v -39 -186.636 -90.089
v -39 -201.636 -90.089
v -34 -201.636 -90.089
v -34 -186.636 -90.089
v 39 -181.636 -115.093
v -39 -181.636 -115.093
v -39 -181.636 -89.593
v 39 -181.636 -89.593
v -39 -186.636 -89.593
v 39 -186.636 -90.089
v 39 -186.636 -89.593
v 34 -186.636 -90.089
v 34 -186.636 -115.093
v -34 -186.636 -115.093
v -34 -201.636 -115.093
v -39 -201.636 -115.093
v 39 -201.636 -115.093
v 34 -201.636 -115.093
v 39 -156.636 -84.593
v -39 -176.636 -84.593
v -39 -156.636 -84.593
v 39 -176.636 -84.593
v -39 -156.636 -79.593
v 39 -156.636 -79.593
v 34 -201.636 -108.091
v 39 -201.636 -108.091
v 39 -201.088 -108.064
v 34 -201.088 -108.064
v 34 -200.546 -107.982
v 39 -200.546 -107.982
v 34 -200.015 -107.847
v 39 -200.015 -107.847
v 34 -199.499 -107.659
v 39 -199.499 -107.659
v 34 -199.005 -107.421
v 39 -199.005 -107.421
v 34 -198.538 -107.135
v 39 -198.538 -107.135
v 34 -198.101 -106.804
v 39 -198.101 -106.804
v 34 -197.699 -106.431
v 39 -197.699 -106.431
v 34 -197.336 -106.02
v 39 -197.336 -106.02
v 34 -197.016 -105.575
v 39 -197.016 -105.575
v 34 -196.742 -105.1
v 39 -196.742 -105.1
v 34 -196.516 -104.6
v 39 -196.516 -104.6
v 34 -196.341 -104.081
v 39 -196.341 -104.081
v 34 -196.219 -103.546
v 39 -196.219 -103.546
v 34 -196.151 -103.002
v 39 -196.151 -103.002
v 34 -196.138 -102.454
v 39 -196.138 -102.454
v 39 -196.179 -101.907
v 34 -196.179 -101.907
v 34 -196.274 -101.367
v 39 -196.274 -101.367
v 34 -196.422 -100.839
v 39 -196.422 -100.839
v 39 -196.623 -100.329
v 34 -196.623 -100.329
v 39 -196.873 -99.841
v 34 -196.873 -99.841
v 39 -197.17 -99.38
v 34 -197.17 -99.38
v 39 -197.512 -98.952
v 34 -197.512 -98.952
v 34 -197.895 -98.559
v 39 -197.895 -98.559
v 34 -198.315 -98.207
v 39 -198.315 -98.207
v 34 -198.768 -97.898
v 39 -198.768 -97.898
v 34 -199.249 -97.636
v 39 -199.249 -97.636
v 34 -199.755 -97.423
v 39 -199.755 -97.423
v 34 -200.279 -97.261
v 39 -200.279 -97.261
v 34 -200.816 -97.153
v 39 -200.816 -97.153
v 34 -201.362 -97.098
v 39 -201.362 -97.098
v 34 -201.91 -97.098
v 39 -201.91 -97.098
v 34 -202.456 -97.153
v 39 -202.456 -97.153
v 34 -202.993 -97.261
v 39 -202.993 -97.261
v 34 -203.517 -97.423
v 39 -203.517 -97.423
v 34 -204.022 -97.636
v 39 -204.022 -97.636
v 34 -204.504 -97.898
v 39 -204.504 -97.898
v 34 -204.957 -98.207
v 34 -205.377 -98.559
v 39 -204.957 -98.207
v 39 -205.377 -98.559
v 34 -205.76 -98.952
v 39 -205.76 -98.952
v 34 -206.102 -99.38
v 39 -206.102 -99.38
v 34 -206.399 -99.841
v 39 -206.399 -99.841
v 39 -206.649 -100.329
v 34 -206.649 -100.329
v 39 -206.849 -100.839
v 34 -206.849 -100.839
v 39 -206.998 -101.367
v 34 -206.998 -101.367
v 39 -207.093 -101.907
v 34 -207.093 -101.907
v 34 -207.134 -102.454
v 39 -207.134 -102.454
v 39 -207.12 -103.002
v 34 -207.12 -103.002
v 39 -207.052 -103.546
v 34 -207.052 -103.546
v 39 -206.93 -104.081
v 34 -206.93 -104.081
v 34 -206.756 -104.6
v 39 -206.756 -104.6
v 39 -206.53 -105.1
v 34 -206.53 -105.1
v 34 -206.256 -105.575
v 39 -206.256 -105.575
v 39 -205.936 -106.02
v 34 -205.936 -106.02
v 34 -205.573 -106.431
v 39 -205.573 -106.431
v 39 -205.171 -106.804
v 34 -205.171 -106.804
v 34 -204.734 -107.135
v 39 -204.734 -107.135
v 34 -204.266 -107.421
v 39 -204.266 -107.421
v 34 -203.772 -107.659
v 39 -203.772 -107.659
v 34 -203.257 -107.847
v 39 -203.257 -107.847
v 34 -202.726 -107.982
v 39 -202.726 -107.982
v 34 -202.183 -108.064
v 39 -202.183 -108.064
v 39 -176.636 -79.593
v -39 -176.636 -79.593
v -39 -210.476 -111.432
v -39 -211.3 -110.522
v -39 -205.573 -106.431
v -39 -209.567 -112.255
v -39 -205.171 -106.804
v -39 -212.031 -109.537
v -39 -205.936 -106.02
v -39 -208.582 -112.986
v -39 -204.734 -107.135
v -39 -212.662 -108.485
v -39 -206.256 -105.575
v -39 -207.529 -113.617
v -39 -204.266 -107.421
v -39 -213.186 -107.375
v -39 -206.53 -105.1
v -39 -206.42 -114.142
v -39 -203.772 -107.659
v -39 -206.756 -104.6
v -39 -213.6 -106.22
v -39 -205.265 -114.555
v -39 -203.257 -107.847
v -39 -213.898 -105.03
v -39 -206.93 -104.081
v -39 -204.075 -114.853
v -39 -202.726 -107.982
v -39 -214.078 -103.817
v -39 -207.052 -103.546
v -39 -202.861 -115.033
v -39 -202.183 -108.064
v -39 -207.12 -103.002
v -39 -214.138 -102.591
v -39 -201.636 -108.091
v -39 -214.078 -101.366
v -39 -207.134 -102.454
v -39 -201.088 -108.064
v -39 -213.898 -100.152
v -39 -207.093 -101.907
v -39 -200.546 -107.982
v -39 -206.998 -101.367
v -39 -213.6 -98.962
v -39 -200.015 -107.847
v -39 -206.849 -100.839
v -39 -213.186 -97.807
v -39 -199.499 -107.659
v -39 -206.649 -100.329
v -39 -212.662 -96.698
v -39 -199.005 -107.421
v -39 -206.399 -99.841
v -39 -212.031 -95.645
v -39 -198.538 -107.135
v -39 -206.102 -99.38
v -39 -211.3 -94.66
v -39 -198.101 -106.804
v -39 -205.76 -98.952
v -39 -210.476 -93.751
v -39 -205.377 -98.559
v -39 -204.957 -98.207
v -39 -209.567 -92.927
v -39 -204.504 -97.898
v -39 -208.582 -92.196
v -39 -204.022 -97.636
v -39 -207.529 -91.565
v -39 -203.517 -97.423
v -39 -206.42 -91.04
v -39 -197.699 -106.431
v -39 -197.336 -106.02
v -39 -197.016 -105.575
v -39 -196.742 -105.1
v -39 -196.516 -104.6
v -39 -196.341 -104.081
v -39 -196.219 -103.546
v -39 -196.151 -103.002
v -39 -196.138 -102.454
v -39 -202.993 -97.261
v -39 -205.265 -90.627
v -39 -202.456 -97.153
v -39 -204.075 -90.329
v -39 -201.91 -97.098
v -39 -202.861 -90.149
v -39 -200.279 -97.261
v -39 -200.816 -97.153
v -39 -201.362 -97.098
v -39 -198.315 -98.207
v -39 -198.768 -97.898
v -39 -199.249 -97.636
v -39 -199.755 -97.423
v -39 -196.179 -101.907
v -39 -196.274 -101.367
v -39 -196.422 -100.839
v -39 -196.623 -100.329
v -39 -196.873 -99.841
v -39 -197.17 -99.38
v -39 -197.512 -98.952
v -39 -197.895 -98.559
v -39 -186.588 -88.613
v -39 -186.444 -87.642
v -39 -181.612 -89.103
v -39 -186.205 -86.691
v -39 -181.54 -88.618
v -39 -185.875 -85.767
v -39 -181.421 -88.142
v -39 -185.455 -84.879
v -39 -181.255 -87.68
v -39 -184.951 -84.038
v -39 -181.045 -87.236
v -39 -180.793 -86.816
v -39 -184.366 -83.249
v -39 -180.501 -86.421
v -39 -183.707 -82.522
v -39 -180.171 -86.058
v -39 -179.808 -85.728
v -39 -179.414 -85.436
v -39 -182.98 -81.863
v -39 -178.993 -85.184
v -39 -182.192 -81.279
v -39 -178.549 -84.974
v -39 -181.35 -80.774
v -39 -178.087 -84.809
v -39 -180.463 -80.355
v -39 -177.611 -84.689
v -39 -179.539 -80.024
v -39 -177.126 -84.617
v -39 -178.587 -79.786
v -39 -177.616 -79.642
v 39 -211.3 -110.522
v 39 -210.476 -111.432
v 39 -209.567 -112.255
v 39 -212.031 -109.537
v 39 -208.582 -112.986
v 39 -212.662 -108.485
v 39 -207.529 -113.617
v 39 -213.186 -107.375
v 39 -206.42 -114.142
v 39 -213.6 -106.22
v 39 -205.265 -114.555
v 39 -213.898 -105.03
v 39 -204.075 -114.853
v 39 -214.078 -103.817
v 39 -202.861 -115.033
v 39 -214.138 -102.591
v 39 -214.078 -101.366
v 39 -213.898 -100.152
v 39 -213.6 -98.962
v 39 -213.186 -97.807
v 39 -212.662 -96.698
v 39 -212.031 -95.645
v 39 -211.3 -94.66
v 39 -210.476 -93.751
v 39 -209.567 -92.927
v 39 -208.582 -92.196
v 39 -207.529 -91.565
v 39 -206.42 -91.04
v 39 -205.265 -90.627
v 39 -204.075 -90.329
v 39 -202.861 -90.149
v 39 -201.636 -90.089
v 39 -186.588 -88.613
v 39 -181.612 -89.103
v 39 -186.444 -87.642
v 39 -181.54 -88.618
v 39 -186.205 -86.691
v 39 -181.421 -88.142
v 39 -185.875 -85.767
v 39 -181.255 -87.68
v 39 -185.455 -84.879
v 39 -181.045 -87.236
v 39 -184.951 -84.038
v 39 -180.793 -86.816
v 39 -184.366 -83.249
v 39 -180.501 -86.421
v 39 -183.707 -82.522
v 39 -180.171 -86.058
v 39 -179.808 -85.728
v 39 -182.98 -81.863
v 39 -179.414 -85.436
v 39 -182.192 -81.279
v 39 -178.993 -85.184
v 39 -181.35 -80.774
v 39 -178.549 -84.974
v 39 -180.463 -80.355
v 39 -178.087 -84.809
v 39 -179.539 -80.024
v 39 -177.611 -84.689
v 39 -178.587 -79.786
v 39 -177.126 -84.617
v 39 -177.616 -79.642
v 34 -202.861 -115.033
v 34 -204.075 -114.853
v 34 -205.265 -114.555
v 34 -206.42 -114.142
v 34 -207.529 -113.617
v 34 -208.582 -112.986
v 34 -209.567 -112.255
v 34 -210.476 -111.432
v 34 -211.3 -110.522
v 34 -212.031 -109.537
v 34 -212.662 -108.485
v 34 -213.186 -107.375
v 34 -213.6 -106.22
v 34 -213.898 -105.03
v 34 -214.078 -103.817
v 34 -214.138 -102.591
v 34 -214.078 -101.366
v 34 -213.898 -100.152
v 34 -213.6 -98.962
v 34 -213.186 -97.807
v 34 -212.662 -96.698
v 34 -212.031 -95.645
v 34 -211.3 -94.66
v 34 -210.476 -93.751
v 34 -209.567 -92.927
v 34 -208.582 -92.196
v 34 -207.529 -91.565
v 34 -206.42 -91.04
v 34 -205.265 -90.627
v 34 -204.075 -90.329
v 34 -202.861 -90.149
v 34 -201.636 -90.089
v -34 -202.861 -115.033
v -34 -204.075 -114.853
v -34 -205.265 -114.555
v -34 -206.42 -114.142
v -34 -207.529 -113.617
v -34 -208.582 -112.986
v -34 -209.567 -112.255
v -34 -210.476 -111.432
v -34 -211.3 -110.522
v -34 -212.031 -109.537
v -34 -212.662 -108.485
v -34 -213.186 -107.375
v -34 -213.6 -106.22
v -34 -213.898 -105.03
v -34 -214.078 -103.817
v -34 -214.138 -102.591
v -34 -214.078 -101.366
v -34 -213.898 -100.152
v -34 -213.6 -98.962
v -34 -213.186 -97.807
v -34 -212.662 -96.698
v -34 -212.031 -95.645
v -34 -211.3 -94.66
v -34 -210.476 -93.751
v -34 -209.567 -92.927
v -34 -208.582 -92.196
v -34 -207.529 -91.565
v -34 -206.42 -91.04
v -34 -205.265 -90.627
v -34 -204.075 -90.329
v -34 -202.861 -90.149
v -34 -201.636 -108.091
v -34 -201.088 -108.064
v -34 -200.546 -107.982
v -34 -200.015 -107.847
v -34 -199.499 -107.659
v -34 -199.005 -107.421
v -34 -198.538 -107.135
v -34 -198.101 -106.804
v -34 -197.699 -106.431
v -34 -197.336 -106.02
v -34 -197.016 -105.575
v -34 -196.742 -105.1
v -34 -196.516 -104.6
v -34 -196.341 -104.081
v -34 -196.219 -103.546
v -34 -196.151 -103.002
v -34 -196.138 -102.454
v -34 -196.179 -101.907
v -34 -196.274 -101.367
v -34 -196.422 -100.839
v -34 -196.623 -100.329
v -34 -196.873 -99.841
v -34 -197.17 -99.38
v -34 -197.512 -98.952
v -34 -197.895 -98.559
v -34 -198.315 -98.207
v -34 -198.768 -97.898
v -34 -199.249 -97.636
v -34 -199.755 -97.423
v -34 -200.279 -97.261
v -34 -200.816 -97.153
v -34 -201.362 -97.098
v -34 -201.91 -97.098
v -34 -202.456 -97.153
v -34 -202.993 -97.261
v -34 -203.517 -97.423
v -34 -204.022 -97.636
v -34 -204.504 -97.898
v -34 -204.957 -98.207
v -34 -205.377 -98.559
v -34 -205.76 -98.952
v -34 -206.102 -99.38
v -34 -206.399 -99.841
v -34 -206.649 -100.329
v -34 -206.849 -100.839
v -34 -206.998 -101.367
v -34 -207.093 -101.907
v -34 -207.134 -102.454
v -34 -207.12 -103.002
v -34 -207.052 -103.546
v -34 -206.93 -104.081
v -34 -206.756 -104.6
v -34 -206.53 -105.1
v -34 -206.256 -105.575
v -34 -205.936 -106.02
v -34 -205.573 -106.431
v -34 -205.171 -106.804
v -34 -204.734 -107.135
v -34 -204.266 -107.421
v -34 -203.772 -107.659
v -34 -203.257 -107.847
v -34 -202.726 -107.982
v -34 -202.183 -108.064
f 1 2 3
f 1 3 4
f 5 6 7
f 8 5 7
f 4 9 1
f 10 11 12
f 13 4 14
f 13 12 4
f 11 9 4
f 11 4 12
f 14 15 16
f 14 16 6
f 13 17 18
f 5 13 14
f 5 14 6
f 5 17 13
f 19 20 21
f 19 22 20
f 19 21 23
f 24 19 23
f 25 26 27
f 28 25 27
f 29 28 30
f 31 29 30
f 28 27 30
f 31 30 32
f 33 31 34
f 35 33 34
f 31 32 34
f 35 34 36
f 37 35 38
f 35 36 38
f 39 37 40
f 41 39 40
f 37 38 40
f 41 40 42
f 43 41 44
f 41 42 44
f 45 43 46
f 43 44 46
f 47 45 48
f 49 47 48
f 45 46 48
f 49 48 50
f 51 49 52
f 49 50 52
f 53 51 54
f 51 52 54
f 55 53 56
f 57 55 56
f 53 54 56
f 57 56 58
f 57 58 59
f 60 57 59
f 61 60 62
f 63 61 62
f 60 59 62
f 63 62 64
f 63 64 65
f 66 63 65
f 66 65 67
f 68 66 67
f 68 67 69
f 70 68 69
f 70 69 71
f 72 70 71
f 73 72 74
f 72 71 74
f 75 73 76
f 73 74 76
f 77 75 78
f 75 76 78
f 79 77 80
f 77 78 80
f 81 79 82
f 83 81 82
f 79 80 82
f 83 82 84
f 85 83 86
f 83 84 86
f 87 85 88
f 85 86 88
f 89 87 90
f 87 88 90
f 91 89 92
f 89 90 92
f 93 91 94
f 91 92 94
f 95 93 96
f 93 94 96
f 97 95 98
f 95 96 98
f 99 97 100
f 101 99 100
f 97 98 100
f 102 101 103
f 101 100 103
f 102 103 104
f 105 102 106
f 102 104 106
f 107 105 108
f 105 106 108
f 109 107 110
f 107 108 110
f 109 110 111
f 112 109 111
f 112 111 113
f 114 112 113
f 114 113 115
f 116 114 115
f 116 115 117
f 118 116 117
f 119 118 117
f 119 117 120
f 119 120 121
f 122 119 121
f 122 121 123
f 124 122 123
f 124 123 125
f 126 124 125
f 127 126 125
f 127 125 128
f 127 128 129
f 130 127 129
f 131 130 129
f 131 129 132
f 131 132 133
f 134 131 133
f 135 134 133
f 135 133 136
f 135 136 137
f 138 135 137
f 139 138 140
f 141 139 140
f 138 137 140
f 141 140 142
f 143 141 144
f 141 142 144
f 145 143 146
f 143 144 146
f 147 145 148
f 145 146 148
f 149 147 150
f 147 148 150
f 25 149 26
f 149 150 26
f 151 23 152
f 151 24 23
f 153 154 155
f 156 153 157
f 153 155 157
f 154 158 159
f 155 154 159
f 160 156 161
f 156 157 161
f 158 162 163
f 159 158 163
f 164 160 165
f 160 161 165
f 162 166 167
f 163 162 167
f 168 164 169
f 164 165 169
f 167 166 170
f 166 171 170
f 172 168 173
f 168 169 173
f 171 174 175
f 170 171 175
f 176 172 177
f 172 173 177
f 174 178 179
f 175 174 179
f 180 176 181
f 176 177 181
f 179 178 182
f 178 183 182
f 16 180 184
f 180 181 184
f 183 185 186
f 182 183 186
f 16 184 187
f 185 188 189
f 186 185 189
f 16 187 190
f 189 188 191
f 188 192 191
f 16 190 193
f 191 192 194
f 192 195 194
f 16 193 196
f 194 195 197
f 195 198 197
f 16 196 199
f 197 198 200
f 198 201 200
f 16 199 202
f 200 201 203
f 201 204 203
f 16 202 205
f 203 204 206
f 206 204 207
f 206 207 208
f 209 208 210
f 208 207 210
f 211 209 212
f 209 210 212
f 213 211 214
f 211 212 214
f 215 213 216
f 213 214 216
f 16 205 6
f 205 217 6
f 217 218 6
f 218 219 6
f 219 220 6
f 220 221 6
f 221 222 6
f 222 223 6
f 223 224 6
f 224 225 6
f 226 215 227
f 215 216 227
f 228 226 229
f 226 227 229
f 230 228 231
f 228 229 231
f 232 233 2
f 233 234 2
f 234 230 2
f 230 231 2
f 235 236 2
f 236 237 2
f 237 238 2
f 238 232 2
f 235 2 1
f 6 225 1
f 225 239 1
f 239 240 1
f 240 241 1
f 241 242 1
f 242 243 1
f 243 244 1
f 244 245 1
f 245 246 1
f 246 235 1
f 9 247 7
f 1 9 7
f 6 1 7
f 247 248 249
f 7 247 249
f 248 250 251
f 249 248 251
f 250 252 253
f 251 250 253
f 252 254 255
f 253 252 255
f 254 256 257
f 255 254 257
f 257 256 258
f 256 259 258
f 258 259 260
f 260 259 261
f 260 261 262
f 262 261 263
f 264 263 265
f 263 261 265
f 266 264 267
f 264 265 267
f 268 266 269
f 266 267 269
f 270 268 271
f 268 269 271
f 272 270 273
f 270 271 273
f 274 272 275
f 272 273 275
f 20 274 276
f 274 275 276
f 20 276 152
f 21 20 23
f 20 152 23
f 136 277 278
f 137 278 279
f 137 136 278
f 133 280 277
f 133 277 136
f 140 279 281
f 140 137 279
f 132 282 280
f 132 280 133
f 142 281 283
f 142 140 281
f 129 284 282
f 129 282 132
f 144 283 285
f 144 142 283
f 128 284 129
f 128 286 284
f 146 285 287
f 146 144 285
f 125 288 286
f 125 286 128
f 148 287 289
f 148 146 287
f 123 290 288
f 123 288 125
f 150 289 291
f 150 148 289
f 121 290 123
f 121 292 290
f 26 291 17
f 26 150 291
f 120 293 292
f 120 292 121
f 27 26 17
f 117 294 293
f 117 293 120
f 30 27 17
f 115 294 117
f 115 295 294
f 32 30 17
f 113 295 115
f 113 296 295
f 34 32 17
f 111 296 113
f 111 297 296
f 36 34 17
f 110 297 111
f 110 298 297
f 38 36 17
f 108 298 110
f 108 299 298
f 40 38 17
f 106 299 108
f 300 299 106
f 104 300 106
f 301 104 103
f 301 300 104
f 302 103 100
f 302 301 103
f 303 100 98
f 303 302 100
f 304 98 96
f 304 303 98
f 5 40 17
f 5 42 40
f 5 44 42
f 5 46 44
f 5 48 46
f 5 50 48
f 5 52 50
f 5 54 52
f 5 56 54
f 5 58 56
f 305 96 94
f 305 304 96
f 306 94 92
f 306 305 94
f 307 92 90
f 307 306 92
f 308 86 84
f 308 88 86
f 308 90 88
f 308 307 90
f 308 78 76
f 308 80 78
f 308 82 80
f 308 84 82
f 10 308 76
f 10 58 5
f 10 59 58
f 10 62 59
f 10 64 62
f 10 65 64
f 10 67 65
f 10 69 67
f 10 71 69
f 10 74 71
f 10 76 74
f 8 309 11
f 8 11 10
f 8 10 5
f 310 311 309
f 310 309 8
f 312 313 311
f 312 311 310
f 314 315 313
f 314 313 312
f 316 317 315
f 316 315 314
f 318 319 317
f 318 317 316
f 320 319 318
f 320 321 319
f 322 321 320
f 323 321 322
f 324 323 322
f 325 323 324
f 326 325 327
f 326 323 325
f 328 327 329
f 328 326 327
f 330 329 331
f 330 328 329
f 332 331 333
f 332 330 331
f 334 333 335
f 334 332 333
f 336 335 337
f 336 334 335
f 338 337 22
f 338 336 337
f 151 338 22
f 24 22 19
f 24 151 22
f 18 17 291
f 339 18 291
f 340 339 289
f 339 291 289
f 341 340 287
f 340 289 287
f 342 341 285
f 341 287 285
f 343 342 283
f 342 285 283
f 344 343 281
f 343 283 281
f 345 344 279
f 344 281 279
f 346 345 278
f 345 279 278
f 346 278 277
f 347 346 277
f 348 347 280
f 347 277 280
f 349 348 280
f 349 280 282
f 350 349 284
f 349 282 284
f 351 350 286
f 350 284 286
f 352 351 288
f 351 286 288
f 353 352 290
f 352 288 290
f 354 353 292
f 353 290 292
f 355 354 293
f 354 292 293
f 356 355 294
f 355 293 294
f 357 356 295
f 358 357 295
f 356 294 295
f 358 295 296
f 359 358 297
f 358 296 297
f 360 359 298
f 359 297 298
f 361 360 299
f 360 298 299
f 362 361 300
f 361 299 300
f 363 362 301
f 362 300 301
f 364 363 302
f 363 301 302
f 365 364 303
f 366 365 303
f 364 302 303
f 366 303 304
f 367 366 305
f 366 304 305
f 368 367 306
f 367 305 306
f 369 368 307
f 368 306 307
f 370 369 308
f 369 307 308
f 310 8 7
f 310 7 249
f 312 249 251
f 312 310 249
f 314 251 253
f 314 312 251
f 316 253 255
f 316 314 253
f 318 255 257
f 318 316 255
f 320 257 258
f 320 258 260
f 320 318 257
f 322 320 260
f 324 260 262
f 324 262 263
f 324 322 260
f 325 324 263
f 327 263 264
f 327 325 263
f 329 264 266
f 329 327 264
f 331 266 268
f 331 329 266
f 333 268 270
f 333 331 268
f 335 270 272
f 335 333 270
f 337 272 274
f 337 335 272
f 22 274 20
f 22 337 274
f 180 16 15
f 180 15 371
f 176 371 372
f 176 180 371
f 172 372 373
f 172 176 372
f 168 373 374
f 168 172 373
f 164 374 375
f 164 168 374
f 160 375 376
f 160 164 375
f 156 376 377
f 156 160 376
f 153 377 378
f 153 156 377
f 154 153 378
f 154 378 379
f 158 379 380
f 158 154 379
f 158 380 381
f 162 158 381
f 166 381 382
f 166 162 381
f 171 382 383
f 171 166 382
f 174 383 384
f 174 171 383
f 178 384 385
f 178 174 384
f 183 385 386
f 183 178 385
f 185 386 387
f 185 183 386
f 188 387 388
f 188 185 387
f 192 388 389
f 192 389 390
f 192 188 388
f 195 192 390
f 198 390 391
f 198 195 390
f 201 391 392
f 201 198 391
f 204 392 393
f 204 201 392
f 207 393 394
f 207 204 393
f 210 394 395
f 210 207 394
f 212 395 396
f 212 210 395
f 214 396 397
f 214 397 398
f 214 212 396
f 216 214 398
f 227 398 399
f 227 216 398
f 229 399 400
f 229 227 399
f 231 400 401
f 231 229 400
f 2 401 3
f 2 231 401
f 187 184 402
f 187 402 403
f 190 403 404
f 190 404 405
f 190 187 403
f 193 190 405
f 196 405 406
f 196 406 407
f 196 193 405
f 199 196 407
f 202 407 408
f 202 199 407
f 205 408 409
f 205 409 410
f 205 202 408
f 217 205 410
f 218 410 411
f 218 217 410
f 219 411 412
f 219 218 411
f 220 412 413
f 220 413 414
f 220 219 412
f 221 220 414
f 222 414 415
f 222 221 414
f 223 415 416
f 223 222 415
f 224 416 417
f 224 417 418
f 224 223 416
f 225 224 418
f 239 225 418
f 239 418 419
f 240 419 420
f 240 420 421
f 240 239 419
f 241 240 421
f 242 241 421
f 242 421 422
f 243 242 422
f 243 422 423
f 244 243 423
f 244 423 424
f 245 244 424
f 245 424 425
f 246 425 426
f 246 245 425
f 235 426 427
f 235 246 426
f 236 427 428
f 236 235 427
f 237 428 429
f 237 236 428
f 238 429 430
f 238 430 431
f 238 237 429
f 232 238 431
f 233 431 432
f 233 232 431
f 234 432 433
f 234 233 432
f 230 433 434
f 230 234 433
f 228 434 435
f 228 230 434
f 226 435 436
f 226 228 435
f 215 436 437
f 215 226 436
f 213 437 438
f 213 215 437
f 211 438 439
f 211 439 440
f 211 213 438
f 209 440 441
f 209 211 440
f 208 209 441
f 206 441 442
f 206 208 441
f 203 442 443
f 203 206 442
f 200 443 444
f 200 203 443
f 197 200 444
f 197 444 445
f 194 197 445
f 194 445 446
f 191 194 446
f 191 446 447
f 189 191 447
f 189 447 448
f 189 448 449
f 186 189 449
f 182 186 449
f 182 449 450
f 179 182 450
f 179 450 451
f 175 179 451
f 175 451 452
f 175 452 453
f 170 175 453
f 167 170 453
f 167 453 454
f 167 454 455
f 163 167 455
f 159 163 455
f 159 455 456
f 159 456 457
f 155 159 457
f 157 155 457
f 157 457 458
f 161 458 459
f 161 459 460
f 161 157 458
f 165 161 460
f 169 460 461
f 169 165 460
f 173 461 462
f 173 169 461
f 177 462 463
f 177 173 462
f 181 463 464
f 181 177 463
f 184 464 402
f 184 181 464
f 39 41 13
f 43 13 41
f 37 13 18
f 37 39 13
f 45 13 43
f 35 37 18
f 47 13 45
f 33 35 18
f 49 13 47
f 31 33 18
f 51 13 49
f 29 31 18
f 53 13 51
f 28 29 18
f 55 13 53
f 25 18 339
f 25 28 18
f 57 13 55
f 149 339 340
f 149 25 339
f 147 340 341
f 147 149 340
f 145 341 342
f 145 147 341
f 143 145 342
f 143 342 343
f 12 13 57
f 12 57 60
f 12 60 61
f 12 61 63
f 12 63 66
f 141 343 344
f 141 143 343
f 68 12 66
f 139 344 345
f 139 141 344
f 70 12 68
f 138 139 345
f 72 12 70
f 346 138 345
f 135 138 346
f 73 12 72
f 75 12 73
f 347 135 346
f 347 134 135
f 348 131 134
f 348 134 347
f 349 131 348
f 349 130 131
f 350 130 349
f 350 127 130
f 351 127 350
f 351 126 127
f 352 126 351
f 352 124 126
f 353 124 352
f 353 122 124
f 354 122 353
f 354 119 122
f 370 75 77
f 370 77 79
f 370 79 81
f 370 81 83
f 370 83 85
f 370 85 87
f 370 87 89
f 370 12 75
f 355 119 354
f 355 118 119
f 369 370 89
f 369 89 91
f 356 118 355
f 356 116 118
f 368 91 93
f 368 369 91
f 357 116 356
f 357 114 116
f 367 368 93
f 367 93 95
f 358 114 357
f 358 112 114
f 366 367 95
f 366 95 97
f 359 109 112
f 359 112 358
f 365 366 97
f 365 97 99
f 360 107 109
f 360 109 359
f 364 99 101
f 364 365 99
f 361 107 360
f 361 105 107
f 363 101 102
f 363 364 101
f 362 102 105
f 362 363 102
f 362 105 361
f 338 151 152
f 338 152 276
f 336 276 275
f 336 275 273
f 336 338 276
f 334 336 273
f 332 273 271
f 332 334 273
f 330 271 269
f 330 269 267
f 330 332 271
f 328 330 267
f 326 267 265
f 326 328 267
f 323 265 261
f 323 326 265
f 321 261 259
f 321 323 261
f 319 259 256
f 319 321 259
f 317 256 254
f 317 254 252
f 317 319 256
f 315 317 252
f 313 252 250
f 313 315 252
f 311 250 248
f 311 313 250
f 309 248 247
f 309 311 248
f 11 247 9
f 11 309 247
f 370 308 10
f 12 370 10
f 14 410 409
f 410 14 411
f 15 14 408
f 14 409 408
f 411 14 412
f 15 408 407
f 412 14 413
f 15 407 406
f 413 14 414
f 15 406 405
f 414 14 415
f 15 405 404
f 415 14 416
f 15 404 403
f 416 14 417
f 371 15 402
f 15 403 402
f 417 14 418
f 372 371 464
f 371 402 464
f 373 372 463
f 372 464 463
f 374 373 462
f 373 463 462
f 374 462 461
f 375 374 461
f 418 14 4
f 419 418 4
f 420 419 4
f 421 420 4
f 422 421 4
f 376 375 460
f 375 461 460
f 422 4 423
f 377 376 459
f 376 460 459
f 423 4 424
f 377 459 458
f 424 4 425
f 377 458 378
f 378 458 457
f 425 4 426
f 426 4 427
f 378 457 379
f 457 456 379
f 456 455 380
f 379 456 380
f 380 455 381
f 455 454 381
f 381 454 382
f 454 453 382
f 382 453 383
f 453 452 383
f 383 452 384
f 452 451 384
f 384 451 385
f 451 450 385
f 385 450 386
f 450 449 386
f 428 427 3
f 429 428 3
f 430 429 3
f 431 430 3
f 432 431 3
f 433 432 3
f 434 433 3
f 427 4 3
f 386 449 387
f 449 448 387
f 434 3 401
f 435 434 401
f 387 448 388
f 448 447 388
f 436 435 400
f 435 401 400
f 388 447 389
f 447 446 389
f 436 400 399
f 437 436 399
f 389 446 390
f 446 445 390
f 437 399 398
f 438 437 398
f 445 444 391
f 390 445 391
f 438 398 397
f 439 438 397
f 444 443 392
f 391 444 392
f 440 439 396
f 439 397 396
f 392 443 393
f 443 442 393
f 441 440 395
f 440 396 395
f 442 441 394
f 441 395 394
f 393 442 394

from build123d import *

# Parameters (mm, degrees)
BOSS_EXTRUDE1_DEPTH = 39
SKETCH3_R           = 5.5
BOSS_EXTRUDE2_DEPTH = 5


with BuildPart() as part:
    # Sketch1 → Boss-Extrude1 (new, symmetric)
    with BuildSketch(Plane.YZ):
        with BuildLine():
            Line((-156.635856385, -79.593365073), (-176.635856385, -79.593365073))
            ThreePointArc((-176.635856385, -79.593365073), (-183.706924197, -82.522297262), (-186.635856385, -89.593365073))
            Line((-186.635856385, -89.593365073), (-186.635856385, -115.093365073))
            Line((-186.635856385, -115.093365073), (-181.635856385, -115.093365073))
            Line((-181.635856385, -115.093365073), (-181.635856385, -89.593365073))
            ThreePointArc((-181.635856385, -89.593365073), (-180.171390291, -86.057831168), (-176.635856385, -84.593365073))
            Line((-176.635856385, -84.593365073), (-156.635856385, -84.593365073))
            Line((-156.635856385, -84.593365073), (-156.635856385, -79.593365073))
        make_face()
    extrude(amount=BOSS_EXTRUDE1_DEPTH, both=True)

    # Sketch3 → Boss-Extrude2 (add)
    with BuildSketch(Plane.YZ.offset(39)):
        with BuildLine():
            Line((-181.635856385, -115.093365073), (-201.635856385, -115.093365073))
            ThreePointArc((-201.635856385, -115.093365073), (-214.13814738, -102.591074078), (-201.635856385, -90.088783083))
            Line((-201.635856385, -90.088783083), (-181.635856385, -90.088783083))
            Line((-181.635856385, -90.088783083), (-181.635856385, -115.093365073))
        make_face()
        with Locations(Location((-201.635856385, -102.591074078, 0), (0, 0, 270))):
            Circle(SKETCH3_R, mode=Mode.SUBTRACT)
    boss_extrude2 = extrude(amount=-BOSS_EXTRUDE2_DEPTH)

    # Mirror1: Boss-Extrude2 across plane
    add(boss_extrude2.mirror(Plane(origin=(0, 0, 0), x_dir=(0, 0, 1), z_dir=(1, 0, 0))))


solid = part.part
